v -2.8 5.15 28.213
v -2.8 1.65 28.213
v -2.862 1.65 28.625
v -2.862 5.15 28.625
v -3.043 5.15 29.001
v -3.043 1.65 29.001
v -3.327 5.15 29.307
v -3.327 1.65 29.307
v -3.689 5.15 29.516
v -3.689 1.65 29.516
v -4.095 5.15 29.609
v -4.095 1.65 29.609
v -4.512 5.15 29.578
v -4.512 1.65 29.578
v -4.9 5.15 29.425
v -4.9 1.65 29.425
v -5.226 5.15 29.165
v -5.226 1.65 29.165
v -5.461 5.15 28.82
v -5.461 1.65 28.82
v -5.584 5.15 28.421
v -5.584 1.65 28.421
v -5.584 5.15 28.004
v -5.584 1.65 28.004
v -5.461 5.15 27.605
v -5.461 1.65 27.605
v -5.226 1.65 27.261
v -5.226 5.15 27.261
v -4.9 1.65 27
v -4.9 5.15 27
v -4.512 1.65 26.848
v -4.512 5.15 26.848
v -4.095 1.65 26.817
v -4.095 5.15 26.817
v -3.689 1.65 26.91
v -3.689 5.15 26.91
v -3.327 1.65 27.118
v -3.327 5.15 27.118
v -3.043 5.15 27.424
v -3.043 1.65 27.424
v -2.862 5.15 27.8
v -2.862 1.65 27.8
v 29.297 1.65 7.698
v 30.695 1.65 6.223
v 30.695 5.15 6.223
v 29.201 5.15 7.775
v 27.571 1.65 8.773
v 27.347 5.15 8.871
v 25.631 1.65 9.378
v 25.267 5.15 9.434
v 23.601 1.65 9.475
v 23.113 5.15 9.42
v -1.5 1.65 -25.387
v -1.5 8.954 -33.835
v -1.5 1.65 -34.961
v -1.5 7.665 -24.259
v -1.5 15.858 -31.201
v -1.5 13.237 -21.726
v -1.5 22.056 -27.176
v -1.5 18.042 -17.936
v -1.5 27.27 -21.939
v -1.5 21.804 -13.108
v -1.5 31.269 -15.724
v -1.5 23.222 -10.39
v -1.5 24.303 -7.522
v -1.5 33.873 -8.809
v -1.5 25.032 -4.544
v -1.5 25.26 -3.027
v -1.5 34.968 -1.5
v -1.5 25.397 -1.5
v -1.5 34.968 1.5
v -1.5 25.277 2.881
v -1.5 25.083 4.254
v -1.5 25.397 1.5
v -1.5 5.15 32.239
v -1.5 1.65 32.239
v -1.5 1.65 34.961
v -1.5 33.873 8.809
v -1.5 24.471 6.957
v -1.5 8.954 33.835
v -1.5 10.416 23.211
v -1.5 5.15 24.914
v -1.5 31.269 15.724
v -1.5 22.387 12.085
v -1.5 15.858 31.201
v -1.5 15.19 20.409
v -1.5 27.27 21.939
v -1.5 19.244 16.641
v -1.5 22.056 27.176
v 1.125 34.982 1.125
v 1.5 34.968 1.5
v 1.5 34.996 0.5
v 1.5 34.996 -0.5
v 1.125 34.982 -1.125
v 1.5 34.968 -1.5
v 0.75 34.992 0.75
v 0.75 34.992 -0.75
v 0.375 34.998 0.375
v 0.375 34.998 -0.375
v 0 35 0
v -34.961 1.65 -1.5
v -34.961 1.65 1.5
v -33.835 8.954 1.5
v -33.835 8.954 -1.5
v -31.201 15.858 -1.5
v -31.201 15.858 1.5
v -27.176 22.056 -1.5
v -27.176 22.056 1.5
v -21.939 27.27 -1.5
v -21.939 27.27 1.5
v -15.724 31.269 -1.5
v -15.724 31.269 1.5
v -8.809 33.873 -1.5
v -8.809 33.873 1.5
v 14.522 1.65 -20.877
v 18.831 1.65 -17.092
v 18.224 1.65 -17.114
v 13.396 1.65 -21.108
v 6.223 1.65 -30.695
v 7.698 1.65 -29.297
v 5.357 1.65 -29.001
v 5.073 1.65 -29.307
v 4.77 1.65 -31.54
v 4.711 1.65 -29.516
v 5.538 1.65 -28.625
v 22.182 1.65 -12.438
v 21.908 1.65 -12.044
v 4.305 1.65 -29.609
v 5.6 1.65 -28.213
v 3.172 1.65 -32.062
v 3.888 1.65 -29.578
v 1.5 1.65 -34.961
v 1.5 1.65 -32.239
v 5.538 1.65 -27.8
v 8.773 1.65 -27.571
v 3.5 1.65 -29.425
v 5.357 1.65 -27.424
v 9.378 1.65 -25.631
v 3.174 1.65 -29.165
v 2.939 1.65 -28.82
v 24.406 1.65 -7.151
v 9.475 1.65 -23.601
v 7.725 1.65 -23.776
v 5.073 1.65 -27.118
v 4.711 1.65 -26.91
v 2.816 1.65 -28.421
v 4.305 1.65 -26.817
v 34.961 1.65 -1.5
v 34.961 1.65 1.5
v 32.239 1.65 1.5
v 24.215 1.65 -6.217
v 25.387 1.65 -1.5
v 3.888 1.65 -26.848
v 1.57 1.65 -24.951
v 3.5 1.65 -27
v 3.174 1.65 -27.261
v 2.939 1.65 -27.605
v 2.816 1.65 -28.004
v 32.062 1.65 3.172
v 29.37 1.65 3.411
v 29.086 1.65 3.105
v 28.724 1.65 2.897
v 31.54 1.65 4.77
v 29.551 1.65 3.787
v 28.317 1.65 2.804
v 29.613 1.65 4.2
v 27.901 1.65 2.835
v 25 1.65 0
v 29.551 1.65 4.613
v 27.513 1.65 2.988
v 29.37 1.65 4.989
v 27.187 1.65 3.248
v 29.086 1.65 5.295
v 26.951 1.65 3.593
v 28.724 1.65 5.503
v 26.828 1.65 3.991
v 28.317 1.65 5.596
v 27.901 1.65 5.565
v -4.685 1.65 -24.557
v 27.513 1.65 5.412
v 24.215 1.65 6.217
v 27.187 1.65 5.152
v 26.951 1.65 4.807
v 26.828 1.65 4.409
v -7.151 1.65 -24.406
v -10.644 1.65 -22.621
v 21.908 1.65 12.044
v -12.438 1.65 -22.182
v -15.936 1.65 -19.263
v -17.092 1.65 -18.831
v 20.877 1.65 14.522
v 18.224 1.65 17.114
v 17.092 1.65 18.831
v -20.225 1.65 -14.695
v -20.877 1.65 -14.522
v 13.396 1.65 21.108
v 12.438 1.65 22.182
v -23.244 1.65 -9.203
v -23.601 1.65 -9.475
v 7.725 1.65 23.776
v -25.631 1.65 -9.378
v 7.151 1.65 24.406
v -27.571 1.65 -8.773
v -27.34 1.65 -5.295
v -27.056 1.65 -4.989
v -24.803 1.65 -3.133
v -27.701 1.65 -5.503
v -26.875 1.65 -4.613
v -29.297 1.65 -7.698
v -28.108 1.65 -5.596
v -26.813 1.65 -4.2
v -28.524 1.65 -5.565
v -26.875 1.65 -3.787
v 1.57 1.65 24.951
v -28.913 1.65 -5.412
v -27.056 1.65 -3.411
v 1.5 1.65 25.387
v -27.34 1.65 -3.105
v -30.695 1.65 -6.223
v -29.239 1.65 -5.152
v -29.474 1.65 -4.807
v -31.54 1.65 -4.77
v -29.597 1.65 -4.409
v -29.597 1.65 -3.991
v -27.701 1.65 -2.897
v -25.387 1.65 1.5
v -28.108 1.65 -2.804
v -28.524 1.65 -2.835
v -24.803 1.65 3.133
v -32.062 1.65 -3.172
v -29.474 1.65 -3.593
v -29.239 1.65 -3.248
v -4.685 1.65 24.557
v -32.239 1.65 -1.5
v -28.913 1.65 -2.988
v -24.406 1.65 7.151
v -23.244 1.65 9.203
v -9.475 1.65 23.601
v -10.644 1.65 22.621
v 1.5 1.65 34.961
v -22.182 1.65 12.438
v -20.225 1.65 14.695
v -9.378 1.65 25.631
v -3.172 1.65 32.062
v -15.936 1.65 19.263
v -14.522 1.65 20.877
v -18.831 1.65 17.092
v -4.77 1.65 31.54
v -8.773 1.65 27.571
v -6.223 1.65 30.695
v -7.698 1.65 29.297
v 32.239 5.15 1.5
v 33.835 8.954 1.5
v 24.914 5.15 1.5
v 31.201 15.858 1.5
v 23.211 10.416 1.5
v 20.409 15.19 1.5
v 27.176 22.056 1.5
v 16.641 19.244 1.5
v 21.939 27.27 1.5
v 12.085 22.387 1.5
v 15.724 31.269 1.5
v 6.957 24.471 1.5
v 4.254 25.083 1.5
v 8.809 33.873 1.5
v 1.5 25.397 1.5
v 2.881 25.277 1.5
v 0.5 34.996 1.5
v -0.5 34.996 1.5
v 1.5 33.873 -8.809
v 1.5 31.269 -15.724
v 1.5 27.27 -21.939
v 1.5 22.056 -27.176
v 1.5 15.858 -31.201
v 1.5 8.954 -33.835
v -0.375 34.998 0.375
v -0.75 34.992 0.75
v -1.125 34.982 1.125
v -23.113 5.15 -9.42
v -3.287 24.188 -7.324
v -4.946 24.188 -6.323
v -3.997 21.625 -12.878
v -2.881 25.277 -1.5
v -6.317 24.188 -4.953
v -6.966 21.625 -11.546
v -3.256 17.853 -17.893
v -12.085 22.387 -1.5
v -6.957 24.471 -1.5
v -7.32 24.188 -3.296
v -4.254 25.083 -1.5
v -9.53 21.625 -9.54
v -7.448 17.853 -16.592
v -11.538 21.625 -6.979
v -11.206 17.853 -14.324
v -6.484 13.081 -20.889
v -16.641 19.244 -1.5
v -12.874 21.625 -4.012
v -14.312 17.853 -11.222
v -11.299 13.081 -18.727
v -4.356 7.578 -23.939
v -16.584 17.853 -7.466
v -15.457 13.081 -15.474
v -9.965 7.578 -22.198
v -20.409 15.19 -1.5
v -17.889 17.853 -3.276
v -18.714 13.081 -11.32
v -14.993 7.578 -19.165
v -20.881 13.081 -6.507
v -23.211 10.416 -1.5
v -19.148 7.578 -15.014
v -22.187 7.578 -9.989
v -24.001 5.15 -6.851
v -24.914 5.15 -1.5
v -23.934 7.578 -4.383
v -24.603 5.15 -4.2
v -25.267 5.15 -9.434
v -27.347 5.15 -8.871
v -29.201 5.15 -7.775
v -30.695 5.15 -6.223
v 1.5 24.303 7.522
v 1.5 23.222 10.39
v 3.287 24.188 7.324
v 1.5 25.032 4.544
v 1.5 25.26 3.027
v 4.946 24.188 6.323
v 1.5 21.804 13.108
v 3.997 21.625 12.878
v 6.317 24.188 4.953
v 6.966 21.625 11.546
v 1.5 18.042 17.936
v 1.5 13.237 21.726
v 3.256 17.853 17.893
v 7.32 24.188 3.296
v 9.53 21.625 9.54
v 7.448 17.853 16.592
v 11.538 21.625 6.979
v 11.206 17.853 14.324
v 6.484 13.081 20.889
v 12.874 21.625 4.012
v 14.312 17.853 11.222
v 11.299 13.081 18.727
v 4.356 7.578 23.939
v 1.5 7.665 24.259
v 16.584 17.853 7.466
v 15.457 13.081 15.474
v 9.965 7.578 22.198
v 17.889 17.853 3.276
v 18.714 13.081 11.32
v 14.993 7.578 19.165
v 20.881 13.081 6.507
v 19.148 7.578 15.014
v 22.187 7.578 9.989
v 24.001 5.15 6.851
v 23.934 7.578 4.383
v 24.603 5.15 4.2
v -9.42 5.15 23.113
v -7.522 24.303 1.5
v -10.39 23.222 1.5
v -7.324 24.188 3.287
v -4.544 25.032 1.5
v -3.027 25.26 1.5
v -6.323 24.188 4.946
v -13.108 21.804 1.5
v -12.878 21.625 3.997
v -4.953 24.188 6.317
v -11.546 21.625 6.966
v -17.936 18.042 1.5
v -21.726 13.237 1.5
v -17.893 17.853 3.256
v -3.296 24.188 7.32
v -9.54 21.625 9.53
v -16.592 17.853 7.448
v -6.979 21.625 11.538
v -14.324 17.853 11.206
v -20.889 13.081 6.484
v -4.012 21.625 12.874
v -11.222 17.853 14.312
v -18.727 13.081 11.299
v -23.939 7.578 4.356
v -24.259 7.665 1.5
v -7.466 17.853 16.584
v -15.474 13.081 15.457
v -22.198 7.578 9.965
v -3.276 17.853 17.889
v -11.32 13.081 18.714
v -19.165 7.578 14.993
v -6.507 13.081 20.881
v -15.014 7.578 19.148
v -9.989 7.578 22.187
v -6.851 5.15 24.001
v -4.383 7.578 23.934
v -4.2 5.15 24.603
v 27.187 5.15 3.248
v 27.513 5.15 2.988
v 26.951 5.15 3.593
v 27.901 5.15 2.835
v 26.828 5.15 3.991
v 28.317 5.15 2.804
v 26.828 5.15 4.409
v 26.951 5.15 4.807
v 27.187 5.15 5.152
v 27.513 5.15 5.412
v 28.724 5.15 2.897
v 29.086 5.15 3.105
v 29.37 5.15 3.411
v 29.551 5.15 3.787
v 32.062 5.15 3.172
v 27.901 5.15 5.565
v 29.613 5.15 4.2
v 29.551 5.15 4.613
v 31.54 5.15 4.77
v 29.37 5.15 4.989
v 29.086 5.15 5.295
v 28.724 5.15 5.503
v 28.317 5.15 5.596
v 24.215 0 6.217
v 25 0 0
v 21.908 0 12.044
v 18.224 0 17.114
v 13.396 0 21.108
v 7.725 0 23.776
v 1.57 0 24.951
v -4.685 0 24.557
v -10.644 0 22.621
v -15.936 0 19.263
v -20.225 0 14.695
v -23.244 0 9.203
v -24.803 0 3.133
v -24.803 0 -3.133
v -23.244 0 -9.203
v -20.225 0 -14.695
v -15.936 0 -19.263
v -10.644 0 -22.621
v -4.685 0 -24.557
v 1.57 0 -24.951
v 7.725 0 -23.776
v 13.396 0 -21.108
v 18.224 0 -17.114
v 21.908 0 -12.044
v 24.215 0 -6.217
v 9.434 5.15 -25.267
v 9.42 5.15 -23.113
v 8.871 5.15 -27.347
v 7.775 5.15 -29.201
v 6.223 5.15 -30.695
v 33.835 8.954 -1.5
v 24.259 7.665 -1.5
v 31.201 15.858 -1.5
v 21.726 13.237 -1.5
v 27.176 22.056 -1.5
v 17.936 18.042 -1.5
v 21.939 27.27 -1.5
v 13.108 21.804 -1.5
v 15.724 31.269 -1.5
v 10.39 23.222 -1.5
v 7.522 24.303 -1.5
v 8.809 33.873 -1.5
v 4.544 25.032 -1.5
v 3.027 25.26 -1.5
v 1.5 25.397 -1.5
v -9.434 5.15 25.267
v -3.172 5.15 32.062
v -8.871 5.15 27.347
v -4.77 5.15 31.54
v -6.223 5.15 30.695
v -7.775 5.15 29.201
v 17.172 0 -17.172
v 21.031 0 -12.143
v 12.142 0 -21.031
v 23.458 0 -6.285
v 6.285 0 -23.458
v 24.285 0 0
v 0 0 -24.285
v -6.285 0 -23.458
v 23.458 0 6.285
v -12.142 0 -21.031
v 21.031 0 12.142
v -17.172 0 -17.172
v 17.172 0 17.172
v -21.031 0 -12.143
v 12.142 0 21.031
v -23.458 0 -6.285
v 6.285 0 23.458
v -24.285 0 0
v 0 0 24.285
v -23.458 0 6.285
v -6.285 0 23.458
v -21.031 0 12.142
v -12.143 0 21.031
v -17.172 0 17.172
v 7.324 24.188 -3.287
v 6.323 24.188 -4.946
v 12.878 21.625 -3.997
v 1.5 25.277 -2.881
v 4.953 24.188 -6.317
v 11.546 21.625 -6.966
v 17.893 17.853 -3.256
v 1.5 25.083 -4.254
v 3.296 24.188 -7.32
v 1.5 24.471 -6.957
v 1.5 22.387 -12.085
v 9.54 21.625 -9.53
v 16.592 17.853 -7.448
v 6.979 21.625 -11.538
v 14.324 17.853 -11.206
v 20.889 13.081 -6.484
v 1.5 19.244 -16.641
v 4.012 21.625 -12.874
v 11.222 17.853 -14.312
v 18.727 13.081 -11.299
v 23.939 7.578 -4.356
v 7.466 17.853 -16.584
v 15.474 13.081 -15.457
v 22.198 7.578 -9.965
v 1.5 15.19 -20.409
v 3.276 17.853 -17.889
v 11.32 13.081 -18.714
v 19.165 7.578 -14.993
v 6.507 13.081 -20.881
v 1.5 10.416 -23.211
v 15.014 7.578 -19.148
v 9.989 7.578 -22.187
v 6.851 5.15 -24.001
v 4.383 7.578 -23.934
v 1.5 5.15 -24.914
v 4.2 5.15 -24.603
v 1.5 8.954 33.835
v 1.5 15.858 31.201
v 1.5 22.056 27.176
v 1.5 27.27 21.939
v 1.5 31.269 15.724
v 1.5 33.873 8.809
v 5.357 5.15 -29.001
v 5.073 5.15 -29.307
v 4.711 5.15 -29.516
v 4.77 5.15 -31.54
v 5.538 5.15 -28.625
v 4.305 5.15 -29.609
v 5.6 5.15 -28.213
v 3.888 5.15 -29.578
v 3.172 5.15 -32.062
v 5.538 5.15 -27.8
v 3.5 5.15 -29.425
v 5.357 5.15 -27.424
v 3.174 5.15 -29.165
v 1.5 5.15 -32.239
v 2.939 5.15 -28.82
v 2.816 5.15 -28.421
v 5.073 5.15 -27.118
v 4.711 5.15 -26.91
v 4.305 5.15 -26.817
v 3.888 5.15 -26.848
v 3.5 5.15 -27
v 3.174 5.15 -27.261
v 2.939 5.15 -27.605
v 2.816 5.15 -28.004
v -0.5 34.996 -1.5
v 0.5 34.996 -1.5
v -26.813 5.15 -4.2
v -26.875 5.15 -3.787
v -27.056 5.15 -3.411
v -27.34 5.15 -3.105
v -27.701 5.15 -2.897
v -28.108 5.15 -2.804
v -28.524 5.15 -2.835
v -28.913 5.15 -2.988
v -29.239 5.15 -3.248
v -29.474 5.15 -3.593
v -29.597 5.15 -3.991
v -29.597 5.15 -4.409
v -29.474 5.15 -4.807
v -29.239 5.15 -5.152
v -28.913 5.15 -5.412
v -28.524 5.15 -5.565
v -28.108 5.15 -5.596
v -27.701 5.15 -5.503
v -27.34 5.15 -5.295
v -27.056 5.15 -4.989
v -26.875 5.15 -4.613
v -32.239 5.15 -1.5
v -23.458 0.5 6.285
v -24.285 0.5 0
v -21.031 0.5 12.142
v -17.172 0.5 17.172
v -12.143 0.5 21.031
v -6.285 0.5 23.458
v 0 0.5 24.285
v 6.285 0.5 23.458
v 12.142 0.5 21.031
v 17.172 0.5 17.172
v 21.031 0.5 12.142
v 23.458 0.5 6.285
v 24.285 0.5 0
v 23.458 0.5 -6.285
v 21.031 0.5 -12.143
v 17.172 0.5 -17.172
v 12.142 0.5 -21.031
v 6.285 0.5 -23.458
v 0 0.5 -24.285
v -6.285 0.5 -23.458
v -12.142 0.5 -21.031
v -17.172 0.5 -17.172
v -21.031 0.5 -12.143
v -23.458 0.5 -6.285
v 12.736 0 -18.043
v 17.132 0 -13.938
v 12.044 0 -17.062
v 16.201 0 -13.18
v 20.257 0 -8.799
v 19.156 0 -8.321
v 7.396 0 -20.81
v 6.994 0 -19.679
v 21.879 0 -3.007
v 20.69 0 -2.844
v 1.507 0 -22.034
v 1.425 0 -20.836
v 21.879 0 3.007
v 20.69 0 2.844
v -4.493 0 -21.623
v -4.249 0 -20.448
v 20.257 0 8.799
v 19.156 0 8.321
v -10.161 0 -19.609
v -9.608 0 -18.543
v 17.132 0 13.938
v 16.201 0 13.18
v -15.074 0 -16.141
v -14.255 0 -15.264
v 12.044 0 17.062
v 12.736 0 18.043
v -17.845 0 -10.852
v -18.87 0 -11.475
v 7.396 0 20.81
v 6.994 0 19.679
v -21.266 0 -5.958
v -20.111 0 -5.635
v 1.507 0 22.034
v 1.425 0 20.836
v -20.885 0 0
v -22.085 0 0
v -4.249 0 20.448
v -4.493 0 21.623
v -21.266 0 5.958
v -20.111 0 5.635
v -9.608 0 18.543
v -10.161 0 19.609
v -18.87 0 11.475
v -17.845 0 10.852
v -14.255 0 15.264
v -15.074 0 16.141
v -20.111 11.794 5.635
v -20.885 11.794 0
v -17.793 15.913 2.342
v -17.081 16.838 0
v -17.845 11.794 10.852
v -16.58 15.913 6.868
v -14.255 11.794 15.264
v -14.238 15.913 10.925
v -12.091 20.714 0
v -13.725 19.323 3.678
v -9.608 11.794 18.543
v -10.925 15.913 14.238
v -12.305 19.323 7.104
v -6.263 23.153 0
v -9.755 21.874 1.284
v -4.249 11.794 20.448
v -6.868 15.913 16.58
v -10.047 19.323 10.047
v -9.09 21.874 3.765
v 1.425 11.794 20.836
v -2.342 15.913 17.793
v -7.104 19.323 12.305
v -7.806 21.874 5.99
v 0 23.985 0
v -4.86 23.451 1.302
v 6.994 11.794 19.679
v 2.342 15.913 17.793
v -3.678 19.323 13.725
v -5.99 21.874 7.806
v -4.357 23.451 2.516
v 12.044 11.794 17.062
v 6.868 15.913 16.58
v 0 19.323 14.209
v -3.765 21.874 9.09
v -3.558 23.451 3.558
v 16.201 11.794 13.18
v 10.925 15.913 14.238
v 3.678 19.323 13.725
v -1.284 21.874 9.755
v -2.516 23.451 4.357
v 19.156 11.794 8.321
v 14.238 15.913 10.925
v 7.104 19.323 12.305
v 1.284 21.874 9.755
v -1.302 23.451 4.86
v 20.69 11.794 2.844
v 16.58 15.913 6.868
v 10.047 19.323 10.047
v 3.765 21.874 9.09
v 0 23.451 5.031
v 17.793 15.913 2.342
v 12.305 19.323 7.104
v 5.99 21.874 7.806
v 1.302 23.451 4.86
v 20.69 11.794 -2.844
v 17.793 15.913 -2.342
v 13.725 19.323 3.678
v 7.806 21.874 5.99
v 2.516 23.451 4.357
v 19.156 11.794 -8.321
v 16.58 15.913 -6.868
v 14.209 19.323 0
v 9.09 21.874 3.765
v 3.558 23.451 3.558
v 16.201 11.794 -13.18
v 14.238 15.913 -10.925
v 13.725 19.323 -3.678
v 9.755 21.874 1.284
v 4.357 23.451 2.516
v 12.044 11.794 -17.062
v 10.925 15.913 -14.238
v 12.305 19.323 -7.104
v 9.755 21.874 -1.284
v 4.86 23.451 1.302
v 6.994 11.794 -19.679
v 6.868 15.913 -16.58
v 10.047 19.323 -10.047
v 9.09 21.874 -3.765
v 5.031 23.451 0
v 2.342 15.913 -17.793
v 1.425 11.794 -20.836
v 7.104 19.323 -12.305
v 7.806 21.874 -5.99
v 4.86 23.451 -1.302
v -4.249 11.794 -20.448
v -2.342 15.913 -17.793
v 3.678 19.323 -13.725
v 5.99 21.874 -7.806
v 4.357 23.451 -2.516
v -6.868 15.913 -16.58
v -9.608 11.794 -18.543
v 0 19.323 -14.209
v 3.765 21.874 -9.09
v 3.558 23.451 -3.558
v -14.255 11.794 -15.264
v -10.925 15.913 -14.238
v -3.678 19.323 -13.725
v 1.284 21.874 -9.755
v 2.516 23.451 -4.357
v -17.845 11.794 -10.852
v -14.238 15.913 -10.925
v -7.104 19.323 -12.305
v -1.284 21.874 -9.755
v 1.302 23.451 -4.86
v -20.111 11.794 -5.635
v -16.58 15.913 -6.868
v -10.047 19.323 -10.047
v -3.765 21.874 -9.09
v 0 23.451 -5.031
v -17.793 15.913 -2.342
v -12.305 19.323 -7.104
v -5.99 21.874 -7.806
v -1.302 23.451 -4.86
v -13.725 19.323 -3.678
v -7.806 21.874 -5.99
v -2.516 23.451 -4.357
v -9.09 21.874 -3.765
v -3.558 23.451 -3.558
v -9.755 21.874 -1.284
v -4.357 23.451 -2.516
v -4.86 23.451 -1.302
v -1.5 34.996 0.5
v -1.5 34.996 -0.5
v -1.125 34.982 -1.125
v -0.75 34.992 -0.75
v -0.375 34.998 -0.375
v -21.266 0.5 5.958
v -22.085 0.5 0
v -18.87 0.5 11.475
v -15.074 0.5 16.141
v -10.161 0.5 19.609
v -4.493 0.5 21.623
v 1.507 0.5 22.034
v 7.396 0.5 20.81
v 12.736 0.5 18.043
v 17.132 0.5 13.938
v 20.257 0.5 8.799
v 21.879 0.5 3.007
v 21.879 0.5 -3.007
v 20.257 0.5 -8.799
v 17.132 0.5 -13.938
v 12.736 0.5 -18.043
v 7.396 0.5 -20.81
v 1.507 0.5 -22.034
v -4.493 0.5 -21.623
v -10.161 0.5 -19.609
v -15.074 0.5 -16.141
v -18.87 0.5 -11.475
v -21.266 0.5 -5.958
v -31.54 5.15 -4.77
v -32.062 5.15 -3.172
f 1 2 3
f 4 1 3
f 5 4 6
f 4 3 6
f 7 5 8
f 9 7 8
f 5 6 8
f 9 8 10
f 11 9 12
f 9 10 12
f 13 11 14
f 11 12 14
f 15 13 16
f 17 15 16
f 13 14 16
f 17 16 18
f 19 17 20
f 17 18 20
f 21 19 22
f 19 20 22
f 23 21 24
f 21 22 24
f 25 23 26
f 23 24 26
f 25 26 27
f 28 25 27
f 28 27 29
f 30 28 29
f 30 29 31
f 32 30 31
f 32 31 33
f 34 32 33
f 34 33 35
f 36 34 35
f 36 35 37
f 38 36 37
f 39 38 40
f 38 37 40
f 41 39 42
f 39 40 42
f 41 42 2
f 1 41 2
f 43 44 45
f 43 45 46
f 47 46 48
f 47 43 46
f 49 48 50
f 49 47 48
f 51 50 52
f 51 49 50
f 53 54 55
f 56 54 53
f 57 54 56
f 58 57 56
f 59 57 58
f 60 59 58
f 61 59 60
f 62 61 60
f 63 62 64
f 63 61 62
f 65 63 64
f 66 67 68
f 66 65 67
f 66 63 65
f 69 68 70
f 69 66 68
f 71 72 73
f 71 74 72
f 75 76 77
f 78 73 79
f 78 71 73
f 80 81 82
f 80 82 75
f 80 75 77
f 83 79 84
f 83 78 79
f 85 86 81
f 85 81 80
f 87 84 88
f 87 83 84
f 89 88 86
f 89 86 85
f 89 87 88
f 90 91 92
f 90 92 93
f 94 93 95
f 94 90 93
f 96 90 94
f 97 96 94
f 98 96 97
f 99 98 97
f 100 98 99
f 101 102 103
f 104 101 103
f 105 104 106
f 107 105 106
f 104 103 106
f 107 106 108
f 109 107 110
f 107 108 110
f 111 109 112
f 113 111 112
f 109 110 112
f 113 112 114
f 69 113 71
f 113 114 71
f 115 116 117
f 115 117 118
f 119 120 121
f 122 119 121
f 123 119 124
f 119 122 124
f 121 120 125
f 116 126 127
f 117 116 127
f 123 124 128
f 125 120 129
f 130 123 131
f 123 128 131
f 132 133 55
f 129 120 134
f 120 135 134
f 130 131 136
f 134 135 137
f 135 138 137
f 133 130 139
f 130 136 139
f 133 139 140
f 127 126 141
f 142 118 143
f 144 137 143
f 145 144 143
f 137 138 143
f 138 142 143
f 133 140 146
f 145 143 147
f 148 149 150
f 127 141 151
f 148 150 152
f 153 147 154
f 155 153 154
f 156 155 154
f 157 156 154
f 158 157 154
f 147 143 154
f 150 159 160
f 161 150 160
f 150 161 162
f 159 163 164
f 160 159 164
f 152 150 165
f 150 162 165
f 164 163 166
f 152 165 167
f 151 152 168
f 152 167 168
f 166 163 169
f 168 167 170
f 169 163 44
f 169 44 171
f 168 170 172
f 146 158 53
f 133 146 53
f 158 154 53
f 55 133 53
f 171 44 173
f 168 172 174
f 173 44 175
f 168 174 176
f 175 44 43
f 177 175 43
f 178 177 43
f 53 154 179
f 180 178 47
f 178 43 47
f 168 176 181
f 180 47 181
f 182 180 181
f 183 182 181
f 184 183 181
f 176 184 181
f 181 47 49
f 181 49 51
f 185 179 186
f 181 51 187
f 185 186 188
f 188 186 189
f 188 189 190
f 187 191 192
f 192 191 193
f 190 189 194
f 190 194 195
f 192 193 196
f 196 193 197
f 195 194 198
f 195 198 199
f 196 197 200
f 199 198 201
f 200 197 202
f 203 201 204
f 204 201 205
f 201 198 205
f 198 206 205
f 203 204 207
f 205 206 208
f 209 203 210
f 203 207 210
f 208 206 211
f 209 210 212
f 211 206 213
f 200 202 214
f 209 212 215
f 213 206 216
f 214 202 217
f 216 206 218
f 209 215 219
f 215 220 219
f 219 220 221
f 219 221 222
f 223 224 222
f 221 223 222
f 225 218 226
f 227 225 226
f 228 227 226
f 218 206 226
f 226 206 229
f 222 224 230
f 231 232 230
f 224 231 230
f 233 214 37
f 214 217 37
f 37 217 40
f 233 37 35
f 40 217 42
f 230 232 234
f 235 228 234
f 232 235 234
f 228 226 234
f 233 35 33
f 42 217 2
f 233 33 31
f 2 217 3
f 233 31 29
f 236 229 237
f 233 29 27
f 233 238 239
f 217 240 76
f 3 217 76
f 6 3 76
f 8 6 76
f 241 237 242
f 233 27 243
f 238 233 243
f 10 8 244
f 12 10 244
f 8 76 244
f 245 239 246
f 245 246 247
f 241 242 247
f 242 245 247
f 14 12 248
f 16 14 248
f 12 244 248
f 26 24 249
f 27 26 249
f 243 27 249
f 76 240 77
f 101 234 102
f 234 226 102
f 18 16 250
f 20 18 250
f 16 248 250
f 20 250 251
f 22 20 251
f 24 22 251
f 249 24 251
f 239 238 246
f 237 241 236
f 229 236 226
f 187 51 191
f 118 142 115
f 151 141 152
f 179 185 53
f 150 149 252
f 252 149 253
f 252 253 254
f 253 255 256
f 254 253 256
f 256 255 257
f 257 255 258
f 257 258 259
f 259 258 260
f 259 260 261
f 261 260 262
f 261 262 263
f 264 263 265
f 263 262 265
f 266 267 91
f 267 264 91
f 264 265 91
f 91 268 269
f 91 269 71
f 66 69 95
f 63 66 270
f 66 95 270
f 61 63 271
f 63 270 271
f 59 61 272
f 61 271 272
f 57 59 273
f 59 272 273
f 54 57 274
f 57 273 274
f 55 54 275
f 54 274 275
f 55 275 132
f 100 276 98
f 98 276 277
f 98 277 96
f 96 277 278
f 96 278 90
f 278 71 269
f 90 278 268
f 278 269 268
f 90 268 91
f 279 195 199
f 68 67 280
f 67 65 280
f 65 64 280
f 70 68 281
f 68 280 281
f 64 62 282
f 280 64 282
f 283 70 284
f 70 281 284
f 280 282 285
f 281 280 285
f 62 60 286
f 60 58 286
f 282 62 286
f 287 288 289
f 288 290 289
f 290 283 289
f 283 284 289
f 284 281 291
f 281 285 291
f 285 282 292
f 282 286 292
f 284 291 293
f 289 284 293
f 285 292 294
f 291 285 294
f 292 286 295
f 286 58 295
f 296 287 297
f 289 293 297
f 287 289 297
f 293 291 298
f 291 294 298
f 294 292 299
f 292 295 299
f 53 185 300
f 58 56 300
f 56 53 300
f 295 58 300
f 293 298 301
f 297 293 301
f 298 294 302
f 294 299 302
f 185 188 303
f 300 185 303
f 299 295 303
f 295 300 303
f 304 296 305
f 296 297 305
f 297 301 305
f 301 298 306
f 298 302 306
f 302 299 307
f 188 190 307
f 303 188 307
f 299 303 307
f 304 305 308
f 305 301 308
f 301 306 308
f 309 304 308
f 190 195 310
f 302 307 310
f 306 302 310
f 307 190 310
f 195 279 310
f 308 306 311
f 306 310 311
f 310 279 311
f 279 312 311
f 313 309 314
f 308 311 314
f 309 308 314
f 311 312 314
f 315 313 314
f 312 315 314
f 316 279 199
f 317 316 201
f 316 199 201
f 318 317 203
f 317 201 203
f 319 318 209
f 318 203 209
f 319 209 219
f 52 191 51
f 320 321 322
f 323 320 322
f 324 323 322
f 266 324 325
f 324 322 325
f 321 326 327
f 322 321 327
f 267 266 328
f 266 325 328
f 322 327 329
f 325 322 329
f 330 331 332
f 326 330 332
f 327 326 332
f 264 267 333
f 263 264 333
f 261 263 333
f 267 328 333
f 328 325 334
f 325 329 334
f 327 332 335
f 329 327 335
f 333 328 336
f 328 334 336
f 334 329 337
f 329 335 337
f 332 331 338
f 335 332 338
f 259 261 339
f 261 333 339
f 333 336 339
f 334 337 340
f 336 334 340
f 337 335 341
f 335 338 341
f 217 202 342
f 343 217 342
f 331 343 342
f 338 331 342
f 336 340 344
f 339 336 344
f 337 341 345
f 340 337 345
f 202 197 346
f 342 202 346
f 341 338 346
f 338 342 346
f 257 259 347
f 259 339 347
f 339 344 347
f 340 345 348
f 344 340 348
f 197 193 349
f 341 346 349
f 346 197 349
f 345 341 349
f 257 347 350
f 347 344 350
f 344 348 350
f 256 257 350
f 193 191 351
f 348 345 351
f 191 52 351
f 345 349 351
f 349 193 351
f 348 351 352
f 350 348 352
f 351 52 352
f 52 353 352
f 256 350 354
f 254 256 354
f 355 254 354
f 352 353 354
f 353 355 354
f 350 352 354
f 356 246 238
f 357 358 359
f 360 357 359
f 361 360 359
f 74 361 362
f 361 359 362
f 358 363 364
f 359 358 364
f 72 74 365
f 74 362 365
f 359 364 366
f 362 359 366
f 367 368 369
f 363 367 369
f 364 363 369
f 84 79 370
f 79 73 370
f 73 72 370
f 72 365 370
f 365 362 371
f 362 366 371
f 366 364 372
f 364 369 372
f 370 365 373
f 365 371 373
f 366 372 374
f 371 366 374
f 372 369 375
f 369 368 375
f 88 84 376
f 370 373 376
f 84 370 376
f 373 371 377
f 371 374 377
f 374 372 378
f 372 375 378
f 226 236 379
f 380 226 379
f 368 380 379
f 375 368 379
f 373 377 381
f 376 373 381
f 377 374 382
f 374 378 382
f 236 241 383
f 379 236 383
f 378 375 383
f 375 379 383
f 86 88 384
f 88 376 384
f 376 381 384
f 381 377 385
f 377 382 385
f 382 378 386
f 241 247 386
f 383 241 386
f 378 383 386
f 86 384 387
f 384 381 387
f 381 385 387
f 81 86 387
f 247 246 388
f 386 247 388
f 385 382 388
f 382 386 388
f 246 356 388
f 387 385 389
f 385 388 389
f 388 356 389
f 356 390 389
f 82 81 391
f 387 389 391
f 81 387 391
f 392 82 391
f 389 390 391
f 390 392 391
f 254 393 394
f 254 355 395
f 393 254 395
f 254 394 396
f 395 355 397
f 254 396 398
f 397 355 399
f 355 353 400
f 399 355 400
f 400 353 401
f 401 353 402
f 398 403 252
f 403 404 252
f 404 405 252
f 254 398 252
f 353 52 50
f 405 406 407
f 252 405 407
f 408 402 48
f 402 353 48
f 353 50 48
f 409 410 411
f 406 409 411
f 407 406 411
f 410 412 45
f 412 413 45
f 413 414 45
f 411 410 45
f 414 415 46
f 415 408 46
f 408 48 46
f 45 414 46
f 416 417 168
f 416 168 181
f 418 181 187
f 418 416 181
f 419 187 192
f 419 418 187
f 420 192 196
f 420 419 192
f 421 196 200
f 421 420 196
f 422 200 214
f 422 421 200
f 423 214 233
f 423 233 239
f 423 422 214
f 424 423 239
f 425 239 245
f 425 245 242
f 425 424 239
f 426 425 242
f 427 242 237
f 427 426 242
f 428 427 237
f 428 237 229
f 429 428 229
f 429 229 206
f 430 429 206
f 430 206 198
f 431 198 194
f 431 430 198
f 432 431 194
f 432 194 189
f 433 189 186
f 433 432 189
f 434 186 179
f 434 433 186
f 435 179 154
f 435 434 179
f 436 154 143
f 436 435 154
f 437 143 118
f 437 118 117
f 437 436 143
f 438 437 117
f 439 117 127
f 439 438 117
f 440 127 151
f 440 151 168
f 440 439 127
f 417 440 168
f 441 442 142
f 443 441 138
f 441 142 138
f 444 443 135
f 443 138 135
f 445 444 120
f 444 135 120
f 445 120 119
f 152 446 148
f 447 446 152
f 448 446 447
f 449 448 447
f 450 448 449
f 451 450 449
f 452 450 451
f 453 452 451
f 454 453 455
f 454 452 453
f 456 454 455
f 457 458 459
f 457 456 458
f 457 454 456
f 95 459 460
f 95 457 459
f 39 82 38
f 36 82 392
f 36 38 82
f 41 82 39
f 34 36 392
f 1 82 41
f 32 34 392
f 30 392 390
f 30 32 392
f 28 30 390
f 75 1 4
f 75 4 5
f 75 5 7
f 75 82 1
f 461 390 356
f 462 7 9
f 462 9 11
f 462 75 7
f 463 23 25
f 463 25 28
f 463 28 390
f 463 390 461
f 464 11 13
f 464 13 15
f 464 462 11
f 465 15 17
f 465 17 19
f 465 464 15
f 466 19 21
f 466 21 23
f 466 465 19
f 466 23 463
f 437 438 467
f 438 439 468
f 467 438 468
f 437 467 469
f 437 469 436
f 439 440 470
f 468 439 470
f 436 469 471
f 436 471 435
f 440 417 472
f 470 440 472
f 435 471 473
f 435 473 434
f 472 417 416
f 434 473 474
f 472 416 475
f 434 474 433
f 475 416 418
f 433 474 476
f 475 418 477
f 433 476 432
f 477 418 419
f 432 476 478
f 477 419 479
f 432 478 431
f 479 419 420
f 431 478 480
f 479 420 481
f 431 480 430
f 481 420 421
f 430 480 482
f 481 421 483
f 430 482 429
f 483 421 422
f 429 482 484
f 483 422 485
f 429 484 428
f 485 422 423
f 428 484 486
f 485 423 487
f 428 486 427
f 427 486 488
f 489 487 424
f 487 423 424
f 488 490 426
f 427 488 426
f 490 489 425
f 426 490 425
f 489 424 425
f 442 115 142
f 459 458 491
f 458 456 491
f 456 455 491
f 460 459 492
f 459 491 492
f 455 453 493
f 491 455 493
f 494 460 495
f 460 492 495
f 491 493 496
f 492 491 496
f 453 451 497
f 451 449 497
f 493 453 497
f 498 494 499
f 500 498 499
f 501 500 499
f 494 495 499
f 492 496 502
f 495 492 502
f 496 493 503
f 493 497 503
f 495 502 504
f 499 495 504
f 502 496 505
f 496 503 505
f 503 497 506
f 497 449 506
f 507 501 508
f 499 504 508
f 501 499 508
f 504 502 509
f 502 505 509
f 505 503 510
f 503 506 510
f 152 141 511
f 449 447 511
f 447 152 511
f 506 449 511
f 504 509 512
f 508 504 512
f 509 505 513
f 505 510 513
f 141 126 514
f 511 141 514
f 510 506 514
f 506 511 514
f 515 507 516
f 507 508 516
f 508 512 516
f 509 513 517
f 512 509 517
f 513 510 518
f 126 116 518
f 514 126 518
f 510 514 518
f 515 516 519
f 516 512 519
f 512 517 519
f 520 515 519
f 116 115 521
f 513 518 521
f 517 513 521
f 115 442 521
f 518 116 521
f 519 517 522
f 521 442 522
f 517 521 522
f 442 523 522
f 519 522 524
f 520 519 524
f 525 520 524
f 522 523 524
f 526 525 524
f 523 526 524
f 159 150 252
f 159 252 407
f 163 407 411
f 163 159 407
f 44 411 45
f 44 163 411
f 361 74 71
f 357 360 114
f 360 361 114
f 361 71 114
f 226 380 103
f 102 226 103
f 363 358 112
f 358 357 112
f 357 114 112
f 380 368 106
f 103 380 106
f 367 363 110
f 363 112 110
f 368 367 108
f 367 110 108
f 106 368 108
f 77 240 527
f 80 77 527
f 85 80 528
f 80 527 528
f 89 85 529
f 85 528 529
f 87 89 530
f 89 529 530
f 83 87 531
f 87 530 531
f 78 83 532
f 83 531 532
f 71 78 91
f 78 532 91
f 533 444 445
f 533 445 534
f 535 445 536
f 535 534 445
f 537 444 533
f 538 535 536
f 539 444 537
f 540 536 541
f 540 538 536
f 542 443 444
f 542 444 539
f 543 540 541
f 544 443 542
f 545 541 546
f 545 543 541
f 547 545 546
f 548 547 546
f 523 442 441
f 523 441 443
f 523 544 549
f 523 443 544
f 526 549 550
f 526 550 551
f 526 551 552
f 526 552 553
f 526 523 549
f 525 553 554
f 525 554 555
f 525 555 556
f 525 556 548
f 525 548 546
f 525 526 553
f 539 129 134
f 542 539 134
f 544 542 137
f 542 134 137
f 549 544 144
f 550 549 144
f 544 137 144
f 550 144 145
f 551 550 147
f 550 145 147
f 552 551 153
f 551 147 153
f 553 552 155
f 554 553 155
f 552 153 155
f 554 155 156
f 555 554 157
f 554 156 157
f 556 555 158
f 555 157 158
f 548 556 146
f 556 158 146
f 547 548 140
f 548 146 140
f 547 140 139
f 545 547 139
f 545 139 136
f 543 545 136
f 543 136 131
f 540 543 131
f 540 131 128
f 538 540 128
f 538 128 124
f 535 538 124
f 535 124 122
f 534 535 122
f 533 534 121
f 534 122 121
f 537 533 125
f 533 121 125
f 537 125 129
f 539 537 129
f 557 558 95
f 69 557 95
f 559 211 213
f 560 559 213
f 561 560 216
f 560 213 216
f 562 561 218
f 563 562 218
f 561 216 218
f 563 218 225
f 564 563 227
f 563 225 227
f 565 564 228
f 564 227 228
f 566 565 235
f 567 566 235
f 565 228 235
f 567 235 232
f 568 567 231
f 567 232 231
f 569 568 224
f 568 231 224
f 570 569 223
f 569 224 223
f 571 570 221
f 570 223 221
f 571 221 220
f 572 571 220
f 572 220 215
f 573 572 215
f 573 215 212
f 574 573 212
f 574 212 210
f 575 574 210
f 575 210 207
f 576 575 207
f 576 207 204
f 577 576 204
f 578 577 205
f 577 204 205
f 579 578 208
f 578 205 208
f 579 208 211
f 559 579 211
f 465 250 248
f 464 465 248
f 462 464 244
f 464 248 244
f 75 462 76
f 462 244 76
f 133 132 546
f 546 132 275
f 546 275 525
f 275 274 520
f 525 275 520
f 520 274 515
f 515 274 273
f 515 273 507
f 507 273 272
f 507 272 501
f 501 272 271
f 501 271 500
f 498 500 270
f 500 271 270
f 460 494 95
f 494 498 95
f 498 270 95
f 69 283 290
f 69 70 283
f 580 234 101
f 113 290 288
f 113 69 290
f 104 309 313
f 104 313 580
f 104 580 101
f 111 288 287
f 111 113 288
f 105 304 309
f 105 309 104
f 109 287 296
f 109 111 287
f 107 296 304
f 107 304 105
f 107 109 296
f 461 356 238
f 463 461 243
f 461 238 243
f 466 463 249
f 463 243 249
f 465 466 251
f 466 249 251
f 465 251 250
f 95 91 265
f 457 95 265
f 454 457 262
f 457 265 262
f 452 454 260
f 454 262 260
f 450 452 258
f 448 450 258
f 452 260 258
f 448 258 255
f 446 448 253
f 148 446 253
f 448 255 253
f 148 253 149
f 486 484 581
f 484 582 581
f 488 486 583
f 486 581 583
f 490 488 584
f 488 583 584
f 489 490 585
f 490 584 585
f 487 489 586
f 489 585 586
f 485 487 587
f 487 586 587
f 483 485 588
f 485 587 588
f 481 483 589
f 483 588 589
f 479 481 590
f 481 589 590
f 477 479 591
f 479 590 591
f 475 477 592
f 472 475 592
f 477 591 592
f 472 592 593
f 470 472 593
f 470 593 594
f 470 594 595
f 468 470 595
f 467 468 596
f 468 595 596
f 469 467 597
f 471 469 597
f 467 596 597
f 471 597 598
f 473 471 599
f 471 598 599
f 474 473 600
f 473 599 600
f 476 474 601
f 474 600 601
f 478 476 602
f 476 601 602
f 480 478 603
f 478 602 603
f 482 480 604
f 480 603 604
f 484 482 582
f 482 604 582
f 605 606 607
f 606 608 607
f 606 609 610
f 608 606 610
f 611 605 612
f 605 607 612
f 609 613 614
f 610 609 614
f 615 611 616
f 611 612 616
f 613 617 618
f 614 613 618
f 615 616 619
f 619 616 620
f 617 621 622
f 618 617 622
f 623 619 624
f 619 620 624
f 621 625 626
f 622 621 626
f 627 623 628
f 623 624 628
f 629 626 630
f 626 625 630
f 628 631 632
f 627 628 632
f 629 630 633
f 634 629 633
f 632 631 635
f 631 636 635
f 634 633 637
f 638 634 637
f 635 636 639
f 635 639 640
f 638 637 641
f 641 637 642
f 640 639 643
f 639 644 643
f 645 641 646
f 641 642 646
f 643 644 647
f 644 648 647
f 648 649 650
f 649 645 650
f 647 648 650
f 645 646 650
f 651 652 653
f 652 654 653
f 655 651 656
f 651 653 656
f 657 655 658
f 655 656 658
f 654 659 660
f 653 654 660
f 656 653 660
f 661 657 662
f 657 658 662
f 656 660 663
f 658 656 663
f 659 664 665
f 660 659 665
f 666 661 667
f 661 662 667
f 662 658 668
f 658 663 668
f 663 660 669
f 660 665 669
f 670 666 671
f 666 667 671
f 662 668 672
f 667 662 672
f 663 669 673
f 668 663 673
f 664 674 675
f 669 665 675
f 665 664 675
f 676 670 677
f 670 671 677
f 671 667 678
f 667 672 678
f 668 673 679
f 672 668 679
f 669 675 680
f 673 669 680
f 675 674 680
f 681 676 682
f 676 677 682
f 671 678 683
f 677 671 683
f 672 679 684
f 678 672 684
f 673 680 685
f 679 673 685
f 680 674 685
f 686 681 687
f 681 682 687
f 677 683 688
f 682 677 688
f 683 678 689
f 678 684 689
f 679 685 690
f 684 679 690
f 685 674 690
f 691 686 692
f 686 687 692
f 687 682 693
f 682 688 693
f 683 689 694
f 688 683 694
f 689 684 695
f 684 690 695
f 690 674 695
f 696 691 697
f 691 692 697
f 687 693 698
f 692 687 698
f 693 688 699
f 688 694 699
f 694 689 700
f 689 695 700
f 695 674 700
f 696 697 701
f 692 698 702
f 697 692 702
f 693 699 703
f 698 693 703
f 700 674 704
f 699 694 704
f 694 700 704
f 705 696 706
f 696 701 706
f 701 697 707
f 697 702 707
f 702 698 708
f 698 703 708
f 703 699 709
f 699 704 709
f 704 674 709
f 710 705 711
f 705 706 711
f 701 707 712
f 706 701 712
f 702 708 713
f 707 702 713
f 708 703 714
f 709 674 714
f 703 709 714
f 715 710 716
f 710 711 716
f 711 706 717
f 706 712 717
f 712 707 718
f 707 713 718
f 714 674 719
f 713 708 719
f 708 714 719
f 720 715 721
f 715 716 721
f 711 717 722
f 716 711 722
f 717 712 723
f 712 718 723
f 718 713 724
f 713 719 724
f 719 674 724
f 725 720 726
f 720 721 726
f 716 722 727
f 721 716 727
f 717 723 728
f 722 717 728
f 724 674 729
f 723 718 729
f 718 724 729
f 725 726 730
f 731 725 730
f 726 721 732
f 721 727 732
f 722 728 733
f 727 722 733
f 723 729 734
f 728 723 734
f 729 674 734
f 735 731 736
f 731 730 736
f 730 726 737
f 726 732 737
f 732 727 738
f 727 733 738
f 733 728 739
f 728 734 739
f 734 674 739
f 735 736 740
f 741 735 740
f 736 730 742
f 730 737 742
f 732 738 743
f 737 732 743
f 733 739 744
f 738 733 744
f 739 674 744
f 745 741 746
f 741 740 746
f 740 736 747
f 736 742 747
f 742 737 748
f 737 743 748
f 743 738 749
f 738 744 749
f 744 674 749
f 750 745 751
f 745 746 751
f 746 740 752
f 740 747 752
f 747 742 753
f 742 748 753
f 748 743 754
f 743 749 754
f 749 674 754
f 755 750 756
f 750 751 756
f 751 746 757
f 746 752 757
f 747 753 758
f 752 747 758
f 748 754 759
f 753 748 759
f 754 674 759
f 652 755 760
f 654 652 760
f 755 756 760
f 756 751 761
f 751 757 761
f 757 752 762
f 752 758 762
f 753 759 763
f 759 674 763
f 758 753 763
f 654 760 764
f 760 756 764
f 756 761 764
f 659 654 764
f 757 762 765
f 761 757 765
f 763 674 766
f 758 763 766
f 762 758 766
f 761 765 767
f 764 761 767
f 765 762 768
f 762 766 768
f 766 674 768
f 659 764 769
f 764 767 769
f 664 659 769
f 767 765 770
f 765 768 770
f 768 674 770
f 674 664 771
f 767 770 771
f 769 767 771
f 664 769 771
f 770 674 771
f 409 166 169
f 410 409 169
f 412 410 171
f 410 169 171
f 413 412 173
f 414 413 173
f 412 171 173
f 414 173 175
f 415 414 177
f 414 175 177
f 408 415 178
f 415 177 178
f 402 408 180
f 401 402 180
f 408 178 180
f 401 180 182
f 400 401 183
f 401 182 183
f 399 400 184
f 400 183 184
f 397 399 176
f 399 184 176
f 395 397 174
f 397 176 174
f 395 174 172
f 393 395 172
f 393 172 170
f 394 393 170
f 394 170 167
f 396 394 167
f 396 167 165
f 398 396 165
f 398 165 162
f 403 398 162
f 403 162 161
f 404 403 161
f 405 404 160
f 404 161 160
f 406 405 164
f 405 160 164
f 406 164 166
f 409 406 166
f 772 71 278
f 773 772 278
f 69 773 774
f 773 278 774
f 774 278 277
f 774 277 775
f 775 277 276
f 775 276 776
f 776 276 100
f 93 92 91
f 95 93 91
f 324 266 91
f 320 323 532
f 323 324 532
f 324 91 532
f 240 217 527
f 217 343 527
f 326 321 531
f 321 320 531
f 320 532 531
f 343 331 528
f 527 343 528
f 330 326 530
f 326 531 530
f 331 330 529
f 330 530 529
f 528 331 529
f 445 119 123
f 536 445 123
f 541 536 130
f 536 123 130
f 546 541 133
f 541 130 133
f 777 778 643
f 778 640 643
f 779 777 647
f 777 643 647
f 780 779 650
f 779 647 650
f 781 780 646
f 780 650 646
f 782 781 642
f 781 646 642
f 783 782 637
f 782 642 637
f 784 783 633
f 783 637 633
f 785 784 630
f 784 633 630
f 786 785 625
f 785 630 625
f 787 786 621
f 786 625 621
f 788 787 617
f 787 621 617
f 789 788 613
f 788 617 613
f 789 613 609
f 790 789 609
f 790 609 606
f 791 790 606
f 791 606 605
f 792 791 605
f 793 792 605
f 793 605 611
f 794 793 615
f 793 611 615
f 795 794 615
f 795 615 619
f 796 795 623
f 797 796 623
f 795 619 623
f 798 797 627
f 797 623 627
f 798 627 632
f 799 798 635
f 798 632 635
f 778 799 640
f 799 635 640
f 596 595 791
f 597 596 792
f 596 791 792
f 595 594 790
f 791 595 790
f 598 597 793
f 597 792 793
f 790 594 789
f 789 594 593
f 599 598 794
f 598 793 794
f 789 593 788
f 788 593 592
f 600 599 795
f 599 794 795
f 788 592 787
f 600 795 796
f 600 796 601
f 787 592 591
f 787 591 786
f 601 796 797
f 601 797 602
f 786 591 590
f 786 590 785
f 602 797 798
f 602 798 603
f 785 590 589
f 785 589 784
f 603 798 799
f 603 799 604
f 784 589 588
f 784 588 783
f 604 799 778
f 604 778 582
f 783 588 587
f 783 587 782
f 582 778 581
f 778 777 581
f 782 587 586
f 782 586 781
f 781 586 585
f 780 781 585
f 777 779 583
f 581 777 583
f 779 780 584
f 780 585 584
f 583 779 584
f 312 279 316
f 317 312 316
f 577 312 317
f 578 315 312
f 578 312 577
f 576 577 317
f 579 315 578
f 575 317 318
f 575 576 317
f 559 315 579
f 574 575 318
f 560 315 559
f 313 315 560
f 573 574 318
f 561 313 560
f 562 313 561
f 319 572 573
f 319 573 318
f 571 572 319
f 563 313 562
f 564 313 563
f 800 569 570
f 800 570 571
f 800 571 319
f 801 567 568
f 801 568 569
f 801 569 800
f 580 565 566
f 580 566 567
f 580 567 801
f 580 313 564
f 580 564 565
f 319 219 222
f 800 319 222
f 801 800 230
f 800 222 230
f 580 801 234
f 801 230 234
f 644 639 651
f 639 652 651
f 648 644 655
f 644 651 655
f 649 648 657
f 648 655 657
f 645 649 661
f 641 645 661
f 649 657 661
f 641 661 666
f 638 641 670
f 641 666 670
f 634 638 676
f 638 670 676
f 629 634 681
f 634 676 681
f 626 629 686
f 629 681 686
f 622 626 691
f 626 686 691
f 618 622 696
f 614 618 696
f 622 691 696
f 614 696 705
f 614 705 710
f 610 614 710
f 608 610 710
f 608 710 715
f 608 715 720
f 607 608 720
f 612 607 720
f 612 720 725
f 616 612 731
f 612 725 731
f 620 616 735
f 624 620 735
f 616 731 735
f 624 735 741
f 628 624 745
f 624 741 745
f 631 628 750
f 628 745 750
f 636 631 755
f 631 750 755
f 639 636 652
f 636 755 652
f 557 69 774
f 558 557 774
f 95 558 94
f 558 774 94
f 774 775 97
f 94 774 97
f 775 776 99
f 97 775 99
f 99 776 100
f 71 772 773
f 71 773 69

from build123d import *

# Parameters (mm, degrees)
BOSS_EXTRUDE1_DEPTH      = 1.5
BOSS_EXTRUDE1_DEPTH_BACK = 1.5
BOSS_EXTRUDE2_DEPTH      = 1.5
BOSS_EXTRUDE2_DEPTH_BACK = 1.5
SKETCH4_W                = 11.052180397
SKETCH4_H                = 1.65
SKETCH5_R                = 1.4
BOSS_EXTRUDE20_DEPTH     = 3.5
SKETCH6_R                = 26
SKETCH6_R_2              = 25
CUT_EXTRUDE1_DEPTH       = 1.65


with BuildPart() as part:
    # Sketch1 → Revolve1 (revolve)
    with BuildSketch(Plane.XY):
        with BuildLine():
            Line((-20.885, 0), (-20.885, 11.793939121))
            ThreePointArc((-20.885, 11.793939121), (-12.091372858, 20.714220415), (0, 23.985))
            Line((0, 23.985), (0, 25.485))
            ThreePointArc((0, 25.485), (-18.020616319, 18.020616319), (-25.485, 0))
            Line((-25.485, 0), (-24.285, 0))
            Line((-24.285, 0), (-24.285, 0.5))
            Line((-24.285, 0.5), (-22.085, 0.5))
            Line((-22.085, 0.5), (-22.085, 0))
            Line((-22.085, 0), (-20.885, 0))
        make_face()
    revolve(axis=Axis((0, 0, 0), (0, 1, 0)))



with BuildPart() as body_2:
    # Sketch2 → Boss-Extrude1 (new body, two sides)
    with BuildSketch(Plane.XY) as boss_extrude1_sk:
        with BuildLine():
            Line((-24.9, 0), (-35, 0))
            ThreePointArc((-35, 0), (0, 35), (35, 0))
            Line((35, 0), (24.9, 0))
            ThreePointArc((24.9, 0), (0, 24.9), (-24.9, 0))
        make_face()
    extrude(amount=BOSS_EXTRUDE1_DEPTH)
    extrude(boss_extrude1_sk.sketch, amount=-BOSS_EXTRUDE1_DEPTH_BACK)

    # Sketch3 → Boss-Extrude2 (add, two sides)
    with BuildSketch(Plane(origin=(0, 0, 0), x_dir=(0, 0, -1), z_dir=(1, 0, 0))) as boss_extrude2_sk:
        with BuildLine():
            Line((35, 0), (24.9, 0))
            ThreePointArc((24.9, 0), (0, 24.9), (-24.9, 0))
            Line((-24.9, 0), (-35, 0))
            ThreePointArc((-35, 0), (0, 35), (35, 0))
        make_face()
    extrude(amount=BOSS_EXTRUDE2_DEPTH)
    extrude(boss_extrude2_sk.sketch, amount=-BOSS_EXTRUDE2_DEPTH_BACK)

    # Sketch4 → Cut-Revolve2 (revolve, cut)
    with BuildSketch(Plane.XY):
        with Locations((-30.371361379, 0.825)):
            Rectangle(SKETCH4_W, SKETCH4_H)
    revolve(axis=Axis((0, 0, 0), (0, 1, 0)), mode=Mode.SUBTRACT)


with BuildPart() as part_1:
    add(part.part)

    add(body_2.part)  # Boss-Extrude20 merges body 2
    # Sketch5 → Boss-Extrude20 (add)
    with BuildSketch(Plane.XZ.offset(-1.65)):
        with BuildLine():
            Line((-32.23863084, -1.5), (-24.23863084, -1.5))
            ThreePointArc((-24.23863084, -1.5), (-23.660511509, -5.471875377), (-22.4360777, -9.294280094))
            ThreePointArc((-22.4360777, -9.294280094), (-27.026694315, -8.998446643), (-30.695451754, -6.223289498))
            ThreePointArc((-30.695451754, -6.223289498), (-31.843056108, -3.984495189), (-32.23863084, -1.5))
        make_face()
        with Locations((-28.212839525, -4.2)):
            Circle(SKETCH5_R, mode=Mode.SUBTRACT)
        with BuildLine():
            Line((24.23863084, 1.5), (32.23863084, 1.5))
            ThreePointArc((32.23863084, 1.5), (31.843056108, 3.984495189), (30.695451754, 6.223289498))
            ThreePointArc((30.695451754, 6.223289498), (27.026694315, 8.998446643), (22.4360777, 9.294280094))
            ThreePointArc((22.4360777, 9.294280094), (23.660511509, 5.471875377), (24.23863084, 1.5))
        make_face()
        with Locations((28.212839525, 4.2)):
            Circle(SKETCH5_R, mode=Mode.SUBTRACT)
        with BuildLine():
            Line((-1.5, 32.23863084), (-1.5, 24.23863084))
            ThreePointArc((-1.5, 24.23863084), (-5.471875377, 23.660511509), (-9.294280094, 22.4360777))
            ThreePointArc((-9.294280094, 22.4360777), (-8.998446643, 27.026694315), (-6.223289498, 30.695451754))
            ThreePointArc((-6.223289498, 30.695451754), (-3.984495189, 31.843056108), (-1.5, 32.23863084))
        make_face()
        with Locations((-4.2, 28.212839525)):
            Circle(SKETCH5_R, mode=Mode.SUBTRACT)
        with BuildLine():
            Line((1.5, -32.23863084), (1.5, -24.23863084))
            ThreePointArc((1.5, -24.23863084), (5.471875377, -23.660511509), (9.294280094, -22.4360777))
            ThreePointArc((9.294280094, -22.4360777), (8.998446643, -27.026694315), (6.223289498, -30.695451754))
            ThreePointArc((6.223289498, -30.695451754), (3.984495189, -31.843056108), (1.5, -32.23863084))
        make_face()
        with Locations((4.2, -28.212839525)):
            Circle(SKETCH5_R, mode=Mode.SUBTRACT)
    extrude(amount=-BOSS_EXTRUDE20_DEPTH)

    # Sketch6 → Cut-Extrude1 (cut)
    with BuildSketch(Plane.XZ):
        Circle(SKETCH6_R)
        Circle(SKETCH6_R_2, mode=Mode.SUBTRACT)
    extrude(amount=-CUT_EXTRUDE1_DEPTH, mode=Mode.SUBTRACT)


solid = part_1.part
